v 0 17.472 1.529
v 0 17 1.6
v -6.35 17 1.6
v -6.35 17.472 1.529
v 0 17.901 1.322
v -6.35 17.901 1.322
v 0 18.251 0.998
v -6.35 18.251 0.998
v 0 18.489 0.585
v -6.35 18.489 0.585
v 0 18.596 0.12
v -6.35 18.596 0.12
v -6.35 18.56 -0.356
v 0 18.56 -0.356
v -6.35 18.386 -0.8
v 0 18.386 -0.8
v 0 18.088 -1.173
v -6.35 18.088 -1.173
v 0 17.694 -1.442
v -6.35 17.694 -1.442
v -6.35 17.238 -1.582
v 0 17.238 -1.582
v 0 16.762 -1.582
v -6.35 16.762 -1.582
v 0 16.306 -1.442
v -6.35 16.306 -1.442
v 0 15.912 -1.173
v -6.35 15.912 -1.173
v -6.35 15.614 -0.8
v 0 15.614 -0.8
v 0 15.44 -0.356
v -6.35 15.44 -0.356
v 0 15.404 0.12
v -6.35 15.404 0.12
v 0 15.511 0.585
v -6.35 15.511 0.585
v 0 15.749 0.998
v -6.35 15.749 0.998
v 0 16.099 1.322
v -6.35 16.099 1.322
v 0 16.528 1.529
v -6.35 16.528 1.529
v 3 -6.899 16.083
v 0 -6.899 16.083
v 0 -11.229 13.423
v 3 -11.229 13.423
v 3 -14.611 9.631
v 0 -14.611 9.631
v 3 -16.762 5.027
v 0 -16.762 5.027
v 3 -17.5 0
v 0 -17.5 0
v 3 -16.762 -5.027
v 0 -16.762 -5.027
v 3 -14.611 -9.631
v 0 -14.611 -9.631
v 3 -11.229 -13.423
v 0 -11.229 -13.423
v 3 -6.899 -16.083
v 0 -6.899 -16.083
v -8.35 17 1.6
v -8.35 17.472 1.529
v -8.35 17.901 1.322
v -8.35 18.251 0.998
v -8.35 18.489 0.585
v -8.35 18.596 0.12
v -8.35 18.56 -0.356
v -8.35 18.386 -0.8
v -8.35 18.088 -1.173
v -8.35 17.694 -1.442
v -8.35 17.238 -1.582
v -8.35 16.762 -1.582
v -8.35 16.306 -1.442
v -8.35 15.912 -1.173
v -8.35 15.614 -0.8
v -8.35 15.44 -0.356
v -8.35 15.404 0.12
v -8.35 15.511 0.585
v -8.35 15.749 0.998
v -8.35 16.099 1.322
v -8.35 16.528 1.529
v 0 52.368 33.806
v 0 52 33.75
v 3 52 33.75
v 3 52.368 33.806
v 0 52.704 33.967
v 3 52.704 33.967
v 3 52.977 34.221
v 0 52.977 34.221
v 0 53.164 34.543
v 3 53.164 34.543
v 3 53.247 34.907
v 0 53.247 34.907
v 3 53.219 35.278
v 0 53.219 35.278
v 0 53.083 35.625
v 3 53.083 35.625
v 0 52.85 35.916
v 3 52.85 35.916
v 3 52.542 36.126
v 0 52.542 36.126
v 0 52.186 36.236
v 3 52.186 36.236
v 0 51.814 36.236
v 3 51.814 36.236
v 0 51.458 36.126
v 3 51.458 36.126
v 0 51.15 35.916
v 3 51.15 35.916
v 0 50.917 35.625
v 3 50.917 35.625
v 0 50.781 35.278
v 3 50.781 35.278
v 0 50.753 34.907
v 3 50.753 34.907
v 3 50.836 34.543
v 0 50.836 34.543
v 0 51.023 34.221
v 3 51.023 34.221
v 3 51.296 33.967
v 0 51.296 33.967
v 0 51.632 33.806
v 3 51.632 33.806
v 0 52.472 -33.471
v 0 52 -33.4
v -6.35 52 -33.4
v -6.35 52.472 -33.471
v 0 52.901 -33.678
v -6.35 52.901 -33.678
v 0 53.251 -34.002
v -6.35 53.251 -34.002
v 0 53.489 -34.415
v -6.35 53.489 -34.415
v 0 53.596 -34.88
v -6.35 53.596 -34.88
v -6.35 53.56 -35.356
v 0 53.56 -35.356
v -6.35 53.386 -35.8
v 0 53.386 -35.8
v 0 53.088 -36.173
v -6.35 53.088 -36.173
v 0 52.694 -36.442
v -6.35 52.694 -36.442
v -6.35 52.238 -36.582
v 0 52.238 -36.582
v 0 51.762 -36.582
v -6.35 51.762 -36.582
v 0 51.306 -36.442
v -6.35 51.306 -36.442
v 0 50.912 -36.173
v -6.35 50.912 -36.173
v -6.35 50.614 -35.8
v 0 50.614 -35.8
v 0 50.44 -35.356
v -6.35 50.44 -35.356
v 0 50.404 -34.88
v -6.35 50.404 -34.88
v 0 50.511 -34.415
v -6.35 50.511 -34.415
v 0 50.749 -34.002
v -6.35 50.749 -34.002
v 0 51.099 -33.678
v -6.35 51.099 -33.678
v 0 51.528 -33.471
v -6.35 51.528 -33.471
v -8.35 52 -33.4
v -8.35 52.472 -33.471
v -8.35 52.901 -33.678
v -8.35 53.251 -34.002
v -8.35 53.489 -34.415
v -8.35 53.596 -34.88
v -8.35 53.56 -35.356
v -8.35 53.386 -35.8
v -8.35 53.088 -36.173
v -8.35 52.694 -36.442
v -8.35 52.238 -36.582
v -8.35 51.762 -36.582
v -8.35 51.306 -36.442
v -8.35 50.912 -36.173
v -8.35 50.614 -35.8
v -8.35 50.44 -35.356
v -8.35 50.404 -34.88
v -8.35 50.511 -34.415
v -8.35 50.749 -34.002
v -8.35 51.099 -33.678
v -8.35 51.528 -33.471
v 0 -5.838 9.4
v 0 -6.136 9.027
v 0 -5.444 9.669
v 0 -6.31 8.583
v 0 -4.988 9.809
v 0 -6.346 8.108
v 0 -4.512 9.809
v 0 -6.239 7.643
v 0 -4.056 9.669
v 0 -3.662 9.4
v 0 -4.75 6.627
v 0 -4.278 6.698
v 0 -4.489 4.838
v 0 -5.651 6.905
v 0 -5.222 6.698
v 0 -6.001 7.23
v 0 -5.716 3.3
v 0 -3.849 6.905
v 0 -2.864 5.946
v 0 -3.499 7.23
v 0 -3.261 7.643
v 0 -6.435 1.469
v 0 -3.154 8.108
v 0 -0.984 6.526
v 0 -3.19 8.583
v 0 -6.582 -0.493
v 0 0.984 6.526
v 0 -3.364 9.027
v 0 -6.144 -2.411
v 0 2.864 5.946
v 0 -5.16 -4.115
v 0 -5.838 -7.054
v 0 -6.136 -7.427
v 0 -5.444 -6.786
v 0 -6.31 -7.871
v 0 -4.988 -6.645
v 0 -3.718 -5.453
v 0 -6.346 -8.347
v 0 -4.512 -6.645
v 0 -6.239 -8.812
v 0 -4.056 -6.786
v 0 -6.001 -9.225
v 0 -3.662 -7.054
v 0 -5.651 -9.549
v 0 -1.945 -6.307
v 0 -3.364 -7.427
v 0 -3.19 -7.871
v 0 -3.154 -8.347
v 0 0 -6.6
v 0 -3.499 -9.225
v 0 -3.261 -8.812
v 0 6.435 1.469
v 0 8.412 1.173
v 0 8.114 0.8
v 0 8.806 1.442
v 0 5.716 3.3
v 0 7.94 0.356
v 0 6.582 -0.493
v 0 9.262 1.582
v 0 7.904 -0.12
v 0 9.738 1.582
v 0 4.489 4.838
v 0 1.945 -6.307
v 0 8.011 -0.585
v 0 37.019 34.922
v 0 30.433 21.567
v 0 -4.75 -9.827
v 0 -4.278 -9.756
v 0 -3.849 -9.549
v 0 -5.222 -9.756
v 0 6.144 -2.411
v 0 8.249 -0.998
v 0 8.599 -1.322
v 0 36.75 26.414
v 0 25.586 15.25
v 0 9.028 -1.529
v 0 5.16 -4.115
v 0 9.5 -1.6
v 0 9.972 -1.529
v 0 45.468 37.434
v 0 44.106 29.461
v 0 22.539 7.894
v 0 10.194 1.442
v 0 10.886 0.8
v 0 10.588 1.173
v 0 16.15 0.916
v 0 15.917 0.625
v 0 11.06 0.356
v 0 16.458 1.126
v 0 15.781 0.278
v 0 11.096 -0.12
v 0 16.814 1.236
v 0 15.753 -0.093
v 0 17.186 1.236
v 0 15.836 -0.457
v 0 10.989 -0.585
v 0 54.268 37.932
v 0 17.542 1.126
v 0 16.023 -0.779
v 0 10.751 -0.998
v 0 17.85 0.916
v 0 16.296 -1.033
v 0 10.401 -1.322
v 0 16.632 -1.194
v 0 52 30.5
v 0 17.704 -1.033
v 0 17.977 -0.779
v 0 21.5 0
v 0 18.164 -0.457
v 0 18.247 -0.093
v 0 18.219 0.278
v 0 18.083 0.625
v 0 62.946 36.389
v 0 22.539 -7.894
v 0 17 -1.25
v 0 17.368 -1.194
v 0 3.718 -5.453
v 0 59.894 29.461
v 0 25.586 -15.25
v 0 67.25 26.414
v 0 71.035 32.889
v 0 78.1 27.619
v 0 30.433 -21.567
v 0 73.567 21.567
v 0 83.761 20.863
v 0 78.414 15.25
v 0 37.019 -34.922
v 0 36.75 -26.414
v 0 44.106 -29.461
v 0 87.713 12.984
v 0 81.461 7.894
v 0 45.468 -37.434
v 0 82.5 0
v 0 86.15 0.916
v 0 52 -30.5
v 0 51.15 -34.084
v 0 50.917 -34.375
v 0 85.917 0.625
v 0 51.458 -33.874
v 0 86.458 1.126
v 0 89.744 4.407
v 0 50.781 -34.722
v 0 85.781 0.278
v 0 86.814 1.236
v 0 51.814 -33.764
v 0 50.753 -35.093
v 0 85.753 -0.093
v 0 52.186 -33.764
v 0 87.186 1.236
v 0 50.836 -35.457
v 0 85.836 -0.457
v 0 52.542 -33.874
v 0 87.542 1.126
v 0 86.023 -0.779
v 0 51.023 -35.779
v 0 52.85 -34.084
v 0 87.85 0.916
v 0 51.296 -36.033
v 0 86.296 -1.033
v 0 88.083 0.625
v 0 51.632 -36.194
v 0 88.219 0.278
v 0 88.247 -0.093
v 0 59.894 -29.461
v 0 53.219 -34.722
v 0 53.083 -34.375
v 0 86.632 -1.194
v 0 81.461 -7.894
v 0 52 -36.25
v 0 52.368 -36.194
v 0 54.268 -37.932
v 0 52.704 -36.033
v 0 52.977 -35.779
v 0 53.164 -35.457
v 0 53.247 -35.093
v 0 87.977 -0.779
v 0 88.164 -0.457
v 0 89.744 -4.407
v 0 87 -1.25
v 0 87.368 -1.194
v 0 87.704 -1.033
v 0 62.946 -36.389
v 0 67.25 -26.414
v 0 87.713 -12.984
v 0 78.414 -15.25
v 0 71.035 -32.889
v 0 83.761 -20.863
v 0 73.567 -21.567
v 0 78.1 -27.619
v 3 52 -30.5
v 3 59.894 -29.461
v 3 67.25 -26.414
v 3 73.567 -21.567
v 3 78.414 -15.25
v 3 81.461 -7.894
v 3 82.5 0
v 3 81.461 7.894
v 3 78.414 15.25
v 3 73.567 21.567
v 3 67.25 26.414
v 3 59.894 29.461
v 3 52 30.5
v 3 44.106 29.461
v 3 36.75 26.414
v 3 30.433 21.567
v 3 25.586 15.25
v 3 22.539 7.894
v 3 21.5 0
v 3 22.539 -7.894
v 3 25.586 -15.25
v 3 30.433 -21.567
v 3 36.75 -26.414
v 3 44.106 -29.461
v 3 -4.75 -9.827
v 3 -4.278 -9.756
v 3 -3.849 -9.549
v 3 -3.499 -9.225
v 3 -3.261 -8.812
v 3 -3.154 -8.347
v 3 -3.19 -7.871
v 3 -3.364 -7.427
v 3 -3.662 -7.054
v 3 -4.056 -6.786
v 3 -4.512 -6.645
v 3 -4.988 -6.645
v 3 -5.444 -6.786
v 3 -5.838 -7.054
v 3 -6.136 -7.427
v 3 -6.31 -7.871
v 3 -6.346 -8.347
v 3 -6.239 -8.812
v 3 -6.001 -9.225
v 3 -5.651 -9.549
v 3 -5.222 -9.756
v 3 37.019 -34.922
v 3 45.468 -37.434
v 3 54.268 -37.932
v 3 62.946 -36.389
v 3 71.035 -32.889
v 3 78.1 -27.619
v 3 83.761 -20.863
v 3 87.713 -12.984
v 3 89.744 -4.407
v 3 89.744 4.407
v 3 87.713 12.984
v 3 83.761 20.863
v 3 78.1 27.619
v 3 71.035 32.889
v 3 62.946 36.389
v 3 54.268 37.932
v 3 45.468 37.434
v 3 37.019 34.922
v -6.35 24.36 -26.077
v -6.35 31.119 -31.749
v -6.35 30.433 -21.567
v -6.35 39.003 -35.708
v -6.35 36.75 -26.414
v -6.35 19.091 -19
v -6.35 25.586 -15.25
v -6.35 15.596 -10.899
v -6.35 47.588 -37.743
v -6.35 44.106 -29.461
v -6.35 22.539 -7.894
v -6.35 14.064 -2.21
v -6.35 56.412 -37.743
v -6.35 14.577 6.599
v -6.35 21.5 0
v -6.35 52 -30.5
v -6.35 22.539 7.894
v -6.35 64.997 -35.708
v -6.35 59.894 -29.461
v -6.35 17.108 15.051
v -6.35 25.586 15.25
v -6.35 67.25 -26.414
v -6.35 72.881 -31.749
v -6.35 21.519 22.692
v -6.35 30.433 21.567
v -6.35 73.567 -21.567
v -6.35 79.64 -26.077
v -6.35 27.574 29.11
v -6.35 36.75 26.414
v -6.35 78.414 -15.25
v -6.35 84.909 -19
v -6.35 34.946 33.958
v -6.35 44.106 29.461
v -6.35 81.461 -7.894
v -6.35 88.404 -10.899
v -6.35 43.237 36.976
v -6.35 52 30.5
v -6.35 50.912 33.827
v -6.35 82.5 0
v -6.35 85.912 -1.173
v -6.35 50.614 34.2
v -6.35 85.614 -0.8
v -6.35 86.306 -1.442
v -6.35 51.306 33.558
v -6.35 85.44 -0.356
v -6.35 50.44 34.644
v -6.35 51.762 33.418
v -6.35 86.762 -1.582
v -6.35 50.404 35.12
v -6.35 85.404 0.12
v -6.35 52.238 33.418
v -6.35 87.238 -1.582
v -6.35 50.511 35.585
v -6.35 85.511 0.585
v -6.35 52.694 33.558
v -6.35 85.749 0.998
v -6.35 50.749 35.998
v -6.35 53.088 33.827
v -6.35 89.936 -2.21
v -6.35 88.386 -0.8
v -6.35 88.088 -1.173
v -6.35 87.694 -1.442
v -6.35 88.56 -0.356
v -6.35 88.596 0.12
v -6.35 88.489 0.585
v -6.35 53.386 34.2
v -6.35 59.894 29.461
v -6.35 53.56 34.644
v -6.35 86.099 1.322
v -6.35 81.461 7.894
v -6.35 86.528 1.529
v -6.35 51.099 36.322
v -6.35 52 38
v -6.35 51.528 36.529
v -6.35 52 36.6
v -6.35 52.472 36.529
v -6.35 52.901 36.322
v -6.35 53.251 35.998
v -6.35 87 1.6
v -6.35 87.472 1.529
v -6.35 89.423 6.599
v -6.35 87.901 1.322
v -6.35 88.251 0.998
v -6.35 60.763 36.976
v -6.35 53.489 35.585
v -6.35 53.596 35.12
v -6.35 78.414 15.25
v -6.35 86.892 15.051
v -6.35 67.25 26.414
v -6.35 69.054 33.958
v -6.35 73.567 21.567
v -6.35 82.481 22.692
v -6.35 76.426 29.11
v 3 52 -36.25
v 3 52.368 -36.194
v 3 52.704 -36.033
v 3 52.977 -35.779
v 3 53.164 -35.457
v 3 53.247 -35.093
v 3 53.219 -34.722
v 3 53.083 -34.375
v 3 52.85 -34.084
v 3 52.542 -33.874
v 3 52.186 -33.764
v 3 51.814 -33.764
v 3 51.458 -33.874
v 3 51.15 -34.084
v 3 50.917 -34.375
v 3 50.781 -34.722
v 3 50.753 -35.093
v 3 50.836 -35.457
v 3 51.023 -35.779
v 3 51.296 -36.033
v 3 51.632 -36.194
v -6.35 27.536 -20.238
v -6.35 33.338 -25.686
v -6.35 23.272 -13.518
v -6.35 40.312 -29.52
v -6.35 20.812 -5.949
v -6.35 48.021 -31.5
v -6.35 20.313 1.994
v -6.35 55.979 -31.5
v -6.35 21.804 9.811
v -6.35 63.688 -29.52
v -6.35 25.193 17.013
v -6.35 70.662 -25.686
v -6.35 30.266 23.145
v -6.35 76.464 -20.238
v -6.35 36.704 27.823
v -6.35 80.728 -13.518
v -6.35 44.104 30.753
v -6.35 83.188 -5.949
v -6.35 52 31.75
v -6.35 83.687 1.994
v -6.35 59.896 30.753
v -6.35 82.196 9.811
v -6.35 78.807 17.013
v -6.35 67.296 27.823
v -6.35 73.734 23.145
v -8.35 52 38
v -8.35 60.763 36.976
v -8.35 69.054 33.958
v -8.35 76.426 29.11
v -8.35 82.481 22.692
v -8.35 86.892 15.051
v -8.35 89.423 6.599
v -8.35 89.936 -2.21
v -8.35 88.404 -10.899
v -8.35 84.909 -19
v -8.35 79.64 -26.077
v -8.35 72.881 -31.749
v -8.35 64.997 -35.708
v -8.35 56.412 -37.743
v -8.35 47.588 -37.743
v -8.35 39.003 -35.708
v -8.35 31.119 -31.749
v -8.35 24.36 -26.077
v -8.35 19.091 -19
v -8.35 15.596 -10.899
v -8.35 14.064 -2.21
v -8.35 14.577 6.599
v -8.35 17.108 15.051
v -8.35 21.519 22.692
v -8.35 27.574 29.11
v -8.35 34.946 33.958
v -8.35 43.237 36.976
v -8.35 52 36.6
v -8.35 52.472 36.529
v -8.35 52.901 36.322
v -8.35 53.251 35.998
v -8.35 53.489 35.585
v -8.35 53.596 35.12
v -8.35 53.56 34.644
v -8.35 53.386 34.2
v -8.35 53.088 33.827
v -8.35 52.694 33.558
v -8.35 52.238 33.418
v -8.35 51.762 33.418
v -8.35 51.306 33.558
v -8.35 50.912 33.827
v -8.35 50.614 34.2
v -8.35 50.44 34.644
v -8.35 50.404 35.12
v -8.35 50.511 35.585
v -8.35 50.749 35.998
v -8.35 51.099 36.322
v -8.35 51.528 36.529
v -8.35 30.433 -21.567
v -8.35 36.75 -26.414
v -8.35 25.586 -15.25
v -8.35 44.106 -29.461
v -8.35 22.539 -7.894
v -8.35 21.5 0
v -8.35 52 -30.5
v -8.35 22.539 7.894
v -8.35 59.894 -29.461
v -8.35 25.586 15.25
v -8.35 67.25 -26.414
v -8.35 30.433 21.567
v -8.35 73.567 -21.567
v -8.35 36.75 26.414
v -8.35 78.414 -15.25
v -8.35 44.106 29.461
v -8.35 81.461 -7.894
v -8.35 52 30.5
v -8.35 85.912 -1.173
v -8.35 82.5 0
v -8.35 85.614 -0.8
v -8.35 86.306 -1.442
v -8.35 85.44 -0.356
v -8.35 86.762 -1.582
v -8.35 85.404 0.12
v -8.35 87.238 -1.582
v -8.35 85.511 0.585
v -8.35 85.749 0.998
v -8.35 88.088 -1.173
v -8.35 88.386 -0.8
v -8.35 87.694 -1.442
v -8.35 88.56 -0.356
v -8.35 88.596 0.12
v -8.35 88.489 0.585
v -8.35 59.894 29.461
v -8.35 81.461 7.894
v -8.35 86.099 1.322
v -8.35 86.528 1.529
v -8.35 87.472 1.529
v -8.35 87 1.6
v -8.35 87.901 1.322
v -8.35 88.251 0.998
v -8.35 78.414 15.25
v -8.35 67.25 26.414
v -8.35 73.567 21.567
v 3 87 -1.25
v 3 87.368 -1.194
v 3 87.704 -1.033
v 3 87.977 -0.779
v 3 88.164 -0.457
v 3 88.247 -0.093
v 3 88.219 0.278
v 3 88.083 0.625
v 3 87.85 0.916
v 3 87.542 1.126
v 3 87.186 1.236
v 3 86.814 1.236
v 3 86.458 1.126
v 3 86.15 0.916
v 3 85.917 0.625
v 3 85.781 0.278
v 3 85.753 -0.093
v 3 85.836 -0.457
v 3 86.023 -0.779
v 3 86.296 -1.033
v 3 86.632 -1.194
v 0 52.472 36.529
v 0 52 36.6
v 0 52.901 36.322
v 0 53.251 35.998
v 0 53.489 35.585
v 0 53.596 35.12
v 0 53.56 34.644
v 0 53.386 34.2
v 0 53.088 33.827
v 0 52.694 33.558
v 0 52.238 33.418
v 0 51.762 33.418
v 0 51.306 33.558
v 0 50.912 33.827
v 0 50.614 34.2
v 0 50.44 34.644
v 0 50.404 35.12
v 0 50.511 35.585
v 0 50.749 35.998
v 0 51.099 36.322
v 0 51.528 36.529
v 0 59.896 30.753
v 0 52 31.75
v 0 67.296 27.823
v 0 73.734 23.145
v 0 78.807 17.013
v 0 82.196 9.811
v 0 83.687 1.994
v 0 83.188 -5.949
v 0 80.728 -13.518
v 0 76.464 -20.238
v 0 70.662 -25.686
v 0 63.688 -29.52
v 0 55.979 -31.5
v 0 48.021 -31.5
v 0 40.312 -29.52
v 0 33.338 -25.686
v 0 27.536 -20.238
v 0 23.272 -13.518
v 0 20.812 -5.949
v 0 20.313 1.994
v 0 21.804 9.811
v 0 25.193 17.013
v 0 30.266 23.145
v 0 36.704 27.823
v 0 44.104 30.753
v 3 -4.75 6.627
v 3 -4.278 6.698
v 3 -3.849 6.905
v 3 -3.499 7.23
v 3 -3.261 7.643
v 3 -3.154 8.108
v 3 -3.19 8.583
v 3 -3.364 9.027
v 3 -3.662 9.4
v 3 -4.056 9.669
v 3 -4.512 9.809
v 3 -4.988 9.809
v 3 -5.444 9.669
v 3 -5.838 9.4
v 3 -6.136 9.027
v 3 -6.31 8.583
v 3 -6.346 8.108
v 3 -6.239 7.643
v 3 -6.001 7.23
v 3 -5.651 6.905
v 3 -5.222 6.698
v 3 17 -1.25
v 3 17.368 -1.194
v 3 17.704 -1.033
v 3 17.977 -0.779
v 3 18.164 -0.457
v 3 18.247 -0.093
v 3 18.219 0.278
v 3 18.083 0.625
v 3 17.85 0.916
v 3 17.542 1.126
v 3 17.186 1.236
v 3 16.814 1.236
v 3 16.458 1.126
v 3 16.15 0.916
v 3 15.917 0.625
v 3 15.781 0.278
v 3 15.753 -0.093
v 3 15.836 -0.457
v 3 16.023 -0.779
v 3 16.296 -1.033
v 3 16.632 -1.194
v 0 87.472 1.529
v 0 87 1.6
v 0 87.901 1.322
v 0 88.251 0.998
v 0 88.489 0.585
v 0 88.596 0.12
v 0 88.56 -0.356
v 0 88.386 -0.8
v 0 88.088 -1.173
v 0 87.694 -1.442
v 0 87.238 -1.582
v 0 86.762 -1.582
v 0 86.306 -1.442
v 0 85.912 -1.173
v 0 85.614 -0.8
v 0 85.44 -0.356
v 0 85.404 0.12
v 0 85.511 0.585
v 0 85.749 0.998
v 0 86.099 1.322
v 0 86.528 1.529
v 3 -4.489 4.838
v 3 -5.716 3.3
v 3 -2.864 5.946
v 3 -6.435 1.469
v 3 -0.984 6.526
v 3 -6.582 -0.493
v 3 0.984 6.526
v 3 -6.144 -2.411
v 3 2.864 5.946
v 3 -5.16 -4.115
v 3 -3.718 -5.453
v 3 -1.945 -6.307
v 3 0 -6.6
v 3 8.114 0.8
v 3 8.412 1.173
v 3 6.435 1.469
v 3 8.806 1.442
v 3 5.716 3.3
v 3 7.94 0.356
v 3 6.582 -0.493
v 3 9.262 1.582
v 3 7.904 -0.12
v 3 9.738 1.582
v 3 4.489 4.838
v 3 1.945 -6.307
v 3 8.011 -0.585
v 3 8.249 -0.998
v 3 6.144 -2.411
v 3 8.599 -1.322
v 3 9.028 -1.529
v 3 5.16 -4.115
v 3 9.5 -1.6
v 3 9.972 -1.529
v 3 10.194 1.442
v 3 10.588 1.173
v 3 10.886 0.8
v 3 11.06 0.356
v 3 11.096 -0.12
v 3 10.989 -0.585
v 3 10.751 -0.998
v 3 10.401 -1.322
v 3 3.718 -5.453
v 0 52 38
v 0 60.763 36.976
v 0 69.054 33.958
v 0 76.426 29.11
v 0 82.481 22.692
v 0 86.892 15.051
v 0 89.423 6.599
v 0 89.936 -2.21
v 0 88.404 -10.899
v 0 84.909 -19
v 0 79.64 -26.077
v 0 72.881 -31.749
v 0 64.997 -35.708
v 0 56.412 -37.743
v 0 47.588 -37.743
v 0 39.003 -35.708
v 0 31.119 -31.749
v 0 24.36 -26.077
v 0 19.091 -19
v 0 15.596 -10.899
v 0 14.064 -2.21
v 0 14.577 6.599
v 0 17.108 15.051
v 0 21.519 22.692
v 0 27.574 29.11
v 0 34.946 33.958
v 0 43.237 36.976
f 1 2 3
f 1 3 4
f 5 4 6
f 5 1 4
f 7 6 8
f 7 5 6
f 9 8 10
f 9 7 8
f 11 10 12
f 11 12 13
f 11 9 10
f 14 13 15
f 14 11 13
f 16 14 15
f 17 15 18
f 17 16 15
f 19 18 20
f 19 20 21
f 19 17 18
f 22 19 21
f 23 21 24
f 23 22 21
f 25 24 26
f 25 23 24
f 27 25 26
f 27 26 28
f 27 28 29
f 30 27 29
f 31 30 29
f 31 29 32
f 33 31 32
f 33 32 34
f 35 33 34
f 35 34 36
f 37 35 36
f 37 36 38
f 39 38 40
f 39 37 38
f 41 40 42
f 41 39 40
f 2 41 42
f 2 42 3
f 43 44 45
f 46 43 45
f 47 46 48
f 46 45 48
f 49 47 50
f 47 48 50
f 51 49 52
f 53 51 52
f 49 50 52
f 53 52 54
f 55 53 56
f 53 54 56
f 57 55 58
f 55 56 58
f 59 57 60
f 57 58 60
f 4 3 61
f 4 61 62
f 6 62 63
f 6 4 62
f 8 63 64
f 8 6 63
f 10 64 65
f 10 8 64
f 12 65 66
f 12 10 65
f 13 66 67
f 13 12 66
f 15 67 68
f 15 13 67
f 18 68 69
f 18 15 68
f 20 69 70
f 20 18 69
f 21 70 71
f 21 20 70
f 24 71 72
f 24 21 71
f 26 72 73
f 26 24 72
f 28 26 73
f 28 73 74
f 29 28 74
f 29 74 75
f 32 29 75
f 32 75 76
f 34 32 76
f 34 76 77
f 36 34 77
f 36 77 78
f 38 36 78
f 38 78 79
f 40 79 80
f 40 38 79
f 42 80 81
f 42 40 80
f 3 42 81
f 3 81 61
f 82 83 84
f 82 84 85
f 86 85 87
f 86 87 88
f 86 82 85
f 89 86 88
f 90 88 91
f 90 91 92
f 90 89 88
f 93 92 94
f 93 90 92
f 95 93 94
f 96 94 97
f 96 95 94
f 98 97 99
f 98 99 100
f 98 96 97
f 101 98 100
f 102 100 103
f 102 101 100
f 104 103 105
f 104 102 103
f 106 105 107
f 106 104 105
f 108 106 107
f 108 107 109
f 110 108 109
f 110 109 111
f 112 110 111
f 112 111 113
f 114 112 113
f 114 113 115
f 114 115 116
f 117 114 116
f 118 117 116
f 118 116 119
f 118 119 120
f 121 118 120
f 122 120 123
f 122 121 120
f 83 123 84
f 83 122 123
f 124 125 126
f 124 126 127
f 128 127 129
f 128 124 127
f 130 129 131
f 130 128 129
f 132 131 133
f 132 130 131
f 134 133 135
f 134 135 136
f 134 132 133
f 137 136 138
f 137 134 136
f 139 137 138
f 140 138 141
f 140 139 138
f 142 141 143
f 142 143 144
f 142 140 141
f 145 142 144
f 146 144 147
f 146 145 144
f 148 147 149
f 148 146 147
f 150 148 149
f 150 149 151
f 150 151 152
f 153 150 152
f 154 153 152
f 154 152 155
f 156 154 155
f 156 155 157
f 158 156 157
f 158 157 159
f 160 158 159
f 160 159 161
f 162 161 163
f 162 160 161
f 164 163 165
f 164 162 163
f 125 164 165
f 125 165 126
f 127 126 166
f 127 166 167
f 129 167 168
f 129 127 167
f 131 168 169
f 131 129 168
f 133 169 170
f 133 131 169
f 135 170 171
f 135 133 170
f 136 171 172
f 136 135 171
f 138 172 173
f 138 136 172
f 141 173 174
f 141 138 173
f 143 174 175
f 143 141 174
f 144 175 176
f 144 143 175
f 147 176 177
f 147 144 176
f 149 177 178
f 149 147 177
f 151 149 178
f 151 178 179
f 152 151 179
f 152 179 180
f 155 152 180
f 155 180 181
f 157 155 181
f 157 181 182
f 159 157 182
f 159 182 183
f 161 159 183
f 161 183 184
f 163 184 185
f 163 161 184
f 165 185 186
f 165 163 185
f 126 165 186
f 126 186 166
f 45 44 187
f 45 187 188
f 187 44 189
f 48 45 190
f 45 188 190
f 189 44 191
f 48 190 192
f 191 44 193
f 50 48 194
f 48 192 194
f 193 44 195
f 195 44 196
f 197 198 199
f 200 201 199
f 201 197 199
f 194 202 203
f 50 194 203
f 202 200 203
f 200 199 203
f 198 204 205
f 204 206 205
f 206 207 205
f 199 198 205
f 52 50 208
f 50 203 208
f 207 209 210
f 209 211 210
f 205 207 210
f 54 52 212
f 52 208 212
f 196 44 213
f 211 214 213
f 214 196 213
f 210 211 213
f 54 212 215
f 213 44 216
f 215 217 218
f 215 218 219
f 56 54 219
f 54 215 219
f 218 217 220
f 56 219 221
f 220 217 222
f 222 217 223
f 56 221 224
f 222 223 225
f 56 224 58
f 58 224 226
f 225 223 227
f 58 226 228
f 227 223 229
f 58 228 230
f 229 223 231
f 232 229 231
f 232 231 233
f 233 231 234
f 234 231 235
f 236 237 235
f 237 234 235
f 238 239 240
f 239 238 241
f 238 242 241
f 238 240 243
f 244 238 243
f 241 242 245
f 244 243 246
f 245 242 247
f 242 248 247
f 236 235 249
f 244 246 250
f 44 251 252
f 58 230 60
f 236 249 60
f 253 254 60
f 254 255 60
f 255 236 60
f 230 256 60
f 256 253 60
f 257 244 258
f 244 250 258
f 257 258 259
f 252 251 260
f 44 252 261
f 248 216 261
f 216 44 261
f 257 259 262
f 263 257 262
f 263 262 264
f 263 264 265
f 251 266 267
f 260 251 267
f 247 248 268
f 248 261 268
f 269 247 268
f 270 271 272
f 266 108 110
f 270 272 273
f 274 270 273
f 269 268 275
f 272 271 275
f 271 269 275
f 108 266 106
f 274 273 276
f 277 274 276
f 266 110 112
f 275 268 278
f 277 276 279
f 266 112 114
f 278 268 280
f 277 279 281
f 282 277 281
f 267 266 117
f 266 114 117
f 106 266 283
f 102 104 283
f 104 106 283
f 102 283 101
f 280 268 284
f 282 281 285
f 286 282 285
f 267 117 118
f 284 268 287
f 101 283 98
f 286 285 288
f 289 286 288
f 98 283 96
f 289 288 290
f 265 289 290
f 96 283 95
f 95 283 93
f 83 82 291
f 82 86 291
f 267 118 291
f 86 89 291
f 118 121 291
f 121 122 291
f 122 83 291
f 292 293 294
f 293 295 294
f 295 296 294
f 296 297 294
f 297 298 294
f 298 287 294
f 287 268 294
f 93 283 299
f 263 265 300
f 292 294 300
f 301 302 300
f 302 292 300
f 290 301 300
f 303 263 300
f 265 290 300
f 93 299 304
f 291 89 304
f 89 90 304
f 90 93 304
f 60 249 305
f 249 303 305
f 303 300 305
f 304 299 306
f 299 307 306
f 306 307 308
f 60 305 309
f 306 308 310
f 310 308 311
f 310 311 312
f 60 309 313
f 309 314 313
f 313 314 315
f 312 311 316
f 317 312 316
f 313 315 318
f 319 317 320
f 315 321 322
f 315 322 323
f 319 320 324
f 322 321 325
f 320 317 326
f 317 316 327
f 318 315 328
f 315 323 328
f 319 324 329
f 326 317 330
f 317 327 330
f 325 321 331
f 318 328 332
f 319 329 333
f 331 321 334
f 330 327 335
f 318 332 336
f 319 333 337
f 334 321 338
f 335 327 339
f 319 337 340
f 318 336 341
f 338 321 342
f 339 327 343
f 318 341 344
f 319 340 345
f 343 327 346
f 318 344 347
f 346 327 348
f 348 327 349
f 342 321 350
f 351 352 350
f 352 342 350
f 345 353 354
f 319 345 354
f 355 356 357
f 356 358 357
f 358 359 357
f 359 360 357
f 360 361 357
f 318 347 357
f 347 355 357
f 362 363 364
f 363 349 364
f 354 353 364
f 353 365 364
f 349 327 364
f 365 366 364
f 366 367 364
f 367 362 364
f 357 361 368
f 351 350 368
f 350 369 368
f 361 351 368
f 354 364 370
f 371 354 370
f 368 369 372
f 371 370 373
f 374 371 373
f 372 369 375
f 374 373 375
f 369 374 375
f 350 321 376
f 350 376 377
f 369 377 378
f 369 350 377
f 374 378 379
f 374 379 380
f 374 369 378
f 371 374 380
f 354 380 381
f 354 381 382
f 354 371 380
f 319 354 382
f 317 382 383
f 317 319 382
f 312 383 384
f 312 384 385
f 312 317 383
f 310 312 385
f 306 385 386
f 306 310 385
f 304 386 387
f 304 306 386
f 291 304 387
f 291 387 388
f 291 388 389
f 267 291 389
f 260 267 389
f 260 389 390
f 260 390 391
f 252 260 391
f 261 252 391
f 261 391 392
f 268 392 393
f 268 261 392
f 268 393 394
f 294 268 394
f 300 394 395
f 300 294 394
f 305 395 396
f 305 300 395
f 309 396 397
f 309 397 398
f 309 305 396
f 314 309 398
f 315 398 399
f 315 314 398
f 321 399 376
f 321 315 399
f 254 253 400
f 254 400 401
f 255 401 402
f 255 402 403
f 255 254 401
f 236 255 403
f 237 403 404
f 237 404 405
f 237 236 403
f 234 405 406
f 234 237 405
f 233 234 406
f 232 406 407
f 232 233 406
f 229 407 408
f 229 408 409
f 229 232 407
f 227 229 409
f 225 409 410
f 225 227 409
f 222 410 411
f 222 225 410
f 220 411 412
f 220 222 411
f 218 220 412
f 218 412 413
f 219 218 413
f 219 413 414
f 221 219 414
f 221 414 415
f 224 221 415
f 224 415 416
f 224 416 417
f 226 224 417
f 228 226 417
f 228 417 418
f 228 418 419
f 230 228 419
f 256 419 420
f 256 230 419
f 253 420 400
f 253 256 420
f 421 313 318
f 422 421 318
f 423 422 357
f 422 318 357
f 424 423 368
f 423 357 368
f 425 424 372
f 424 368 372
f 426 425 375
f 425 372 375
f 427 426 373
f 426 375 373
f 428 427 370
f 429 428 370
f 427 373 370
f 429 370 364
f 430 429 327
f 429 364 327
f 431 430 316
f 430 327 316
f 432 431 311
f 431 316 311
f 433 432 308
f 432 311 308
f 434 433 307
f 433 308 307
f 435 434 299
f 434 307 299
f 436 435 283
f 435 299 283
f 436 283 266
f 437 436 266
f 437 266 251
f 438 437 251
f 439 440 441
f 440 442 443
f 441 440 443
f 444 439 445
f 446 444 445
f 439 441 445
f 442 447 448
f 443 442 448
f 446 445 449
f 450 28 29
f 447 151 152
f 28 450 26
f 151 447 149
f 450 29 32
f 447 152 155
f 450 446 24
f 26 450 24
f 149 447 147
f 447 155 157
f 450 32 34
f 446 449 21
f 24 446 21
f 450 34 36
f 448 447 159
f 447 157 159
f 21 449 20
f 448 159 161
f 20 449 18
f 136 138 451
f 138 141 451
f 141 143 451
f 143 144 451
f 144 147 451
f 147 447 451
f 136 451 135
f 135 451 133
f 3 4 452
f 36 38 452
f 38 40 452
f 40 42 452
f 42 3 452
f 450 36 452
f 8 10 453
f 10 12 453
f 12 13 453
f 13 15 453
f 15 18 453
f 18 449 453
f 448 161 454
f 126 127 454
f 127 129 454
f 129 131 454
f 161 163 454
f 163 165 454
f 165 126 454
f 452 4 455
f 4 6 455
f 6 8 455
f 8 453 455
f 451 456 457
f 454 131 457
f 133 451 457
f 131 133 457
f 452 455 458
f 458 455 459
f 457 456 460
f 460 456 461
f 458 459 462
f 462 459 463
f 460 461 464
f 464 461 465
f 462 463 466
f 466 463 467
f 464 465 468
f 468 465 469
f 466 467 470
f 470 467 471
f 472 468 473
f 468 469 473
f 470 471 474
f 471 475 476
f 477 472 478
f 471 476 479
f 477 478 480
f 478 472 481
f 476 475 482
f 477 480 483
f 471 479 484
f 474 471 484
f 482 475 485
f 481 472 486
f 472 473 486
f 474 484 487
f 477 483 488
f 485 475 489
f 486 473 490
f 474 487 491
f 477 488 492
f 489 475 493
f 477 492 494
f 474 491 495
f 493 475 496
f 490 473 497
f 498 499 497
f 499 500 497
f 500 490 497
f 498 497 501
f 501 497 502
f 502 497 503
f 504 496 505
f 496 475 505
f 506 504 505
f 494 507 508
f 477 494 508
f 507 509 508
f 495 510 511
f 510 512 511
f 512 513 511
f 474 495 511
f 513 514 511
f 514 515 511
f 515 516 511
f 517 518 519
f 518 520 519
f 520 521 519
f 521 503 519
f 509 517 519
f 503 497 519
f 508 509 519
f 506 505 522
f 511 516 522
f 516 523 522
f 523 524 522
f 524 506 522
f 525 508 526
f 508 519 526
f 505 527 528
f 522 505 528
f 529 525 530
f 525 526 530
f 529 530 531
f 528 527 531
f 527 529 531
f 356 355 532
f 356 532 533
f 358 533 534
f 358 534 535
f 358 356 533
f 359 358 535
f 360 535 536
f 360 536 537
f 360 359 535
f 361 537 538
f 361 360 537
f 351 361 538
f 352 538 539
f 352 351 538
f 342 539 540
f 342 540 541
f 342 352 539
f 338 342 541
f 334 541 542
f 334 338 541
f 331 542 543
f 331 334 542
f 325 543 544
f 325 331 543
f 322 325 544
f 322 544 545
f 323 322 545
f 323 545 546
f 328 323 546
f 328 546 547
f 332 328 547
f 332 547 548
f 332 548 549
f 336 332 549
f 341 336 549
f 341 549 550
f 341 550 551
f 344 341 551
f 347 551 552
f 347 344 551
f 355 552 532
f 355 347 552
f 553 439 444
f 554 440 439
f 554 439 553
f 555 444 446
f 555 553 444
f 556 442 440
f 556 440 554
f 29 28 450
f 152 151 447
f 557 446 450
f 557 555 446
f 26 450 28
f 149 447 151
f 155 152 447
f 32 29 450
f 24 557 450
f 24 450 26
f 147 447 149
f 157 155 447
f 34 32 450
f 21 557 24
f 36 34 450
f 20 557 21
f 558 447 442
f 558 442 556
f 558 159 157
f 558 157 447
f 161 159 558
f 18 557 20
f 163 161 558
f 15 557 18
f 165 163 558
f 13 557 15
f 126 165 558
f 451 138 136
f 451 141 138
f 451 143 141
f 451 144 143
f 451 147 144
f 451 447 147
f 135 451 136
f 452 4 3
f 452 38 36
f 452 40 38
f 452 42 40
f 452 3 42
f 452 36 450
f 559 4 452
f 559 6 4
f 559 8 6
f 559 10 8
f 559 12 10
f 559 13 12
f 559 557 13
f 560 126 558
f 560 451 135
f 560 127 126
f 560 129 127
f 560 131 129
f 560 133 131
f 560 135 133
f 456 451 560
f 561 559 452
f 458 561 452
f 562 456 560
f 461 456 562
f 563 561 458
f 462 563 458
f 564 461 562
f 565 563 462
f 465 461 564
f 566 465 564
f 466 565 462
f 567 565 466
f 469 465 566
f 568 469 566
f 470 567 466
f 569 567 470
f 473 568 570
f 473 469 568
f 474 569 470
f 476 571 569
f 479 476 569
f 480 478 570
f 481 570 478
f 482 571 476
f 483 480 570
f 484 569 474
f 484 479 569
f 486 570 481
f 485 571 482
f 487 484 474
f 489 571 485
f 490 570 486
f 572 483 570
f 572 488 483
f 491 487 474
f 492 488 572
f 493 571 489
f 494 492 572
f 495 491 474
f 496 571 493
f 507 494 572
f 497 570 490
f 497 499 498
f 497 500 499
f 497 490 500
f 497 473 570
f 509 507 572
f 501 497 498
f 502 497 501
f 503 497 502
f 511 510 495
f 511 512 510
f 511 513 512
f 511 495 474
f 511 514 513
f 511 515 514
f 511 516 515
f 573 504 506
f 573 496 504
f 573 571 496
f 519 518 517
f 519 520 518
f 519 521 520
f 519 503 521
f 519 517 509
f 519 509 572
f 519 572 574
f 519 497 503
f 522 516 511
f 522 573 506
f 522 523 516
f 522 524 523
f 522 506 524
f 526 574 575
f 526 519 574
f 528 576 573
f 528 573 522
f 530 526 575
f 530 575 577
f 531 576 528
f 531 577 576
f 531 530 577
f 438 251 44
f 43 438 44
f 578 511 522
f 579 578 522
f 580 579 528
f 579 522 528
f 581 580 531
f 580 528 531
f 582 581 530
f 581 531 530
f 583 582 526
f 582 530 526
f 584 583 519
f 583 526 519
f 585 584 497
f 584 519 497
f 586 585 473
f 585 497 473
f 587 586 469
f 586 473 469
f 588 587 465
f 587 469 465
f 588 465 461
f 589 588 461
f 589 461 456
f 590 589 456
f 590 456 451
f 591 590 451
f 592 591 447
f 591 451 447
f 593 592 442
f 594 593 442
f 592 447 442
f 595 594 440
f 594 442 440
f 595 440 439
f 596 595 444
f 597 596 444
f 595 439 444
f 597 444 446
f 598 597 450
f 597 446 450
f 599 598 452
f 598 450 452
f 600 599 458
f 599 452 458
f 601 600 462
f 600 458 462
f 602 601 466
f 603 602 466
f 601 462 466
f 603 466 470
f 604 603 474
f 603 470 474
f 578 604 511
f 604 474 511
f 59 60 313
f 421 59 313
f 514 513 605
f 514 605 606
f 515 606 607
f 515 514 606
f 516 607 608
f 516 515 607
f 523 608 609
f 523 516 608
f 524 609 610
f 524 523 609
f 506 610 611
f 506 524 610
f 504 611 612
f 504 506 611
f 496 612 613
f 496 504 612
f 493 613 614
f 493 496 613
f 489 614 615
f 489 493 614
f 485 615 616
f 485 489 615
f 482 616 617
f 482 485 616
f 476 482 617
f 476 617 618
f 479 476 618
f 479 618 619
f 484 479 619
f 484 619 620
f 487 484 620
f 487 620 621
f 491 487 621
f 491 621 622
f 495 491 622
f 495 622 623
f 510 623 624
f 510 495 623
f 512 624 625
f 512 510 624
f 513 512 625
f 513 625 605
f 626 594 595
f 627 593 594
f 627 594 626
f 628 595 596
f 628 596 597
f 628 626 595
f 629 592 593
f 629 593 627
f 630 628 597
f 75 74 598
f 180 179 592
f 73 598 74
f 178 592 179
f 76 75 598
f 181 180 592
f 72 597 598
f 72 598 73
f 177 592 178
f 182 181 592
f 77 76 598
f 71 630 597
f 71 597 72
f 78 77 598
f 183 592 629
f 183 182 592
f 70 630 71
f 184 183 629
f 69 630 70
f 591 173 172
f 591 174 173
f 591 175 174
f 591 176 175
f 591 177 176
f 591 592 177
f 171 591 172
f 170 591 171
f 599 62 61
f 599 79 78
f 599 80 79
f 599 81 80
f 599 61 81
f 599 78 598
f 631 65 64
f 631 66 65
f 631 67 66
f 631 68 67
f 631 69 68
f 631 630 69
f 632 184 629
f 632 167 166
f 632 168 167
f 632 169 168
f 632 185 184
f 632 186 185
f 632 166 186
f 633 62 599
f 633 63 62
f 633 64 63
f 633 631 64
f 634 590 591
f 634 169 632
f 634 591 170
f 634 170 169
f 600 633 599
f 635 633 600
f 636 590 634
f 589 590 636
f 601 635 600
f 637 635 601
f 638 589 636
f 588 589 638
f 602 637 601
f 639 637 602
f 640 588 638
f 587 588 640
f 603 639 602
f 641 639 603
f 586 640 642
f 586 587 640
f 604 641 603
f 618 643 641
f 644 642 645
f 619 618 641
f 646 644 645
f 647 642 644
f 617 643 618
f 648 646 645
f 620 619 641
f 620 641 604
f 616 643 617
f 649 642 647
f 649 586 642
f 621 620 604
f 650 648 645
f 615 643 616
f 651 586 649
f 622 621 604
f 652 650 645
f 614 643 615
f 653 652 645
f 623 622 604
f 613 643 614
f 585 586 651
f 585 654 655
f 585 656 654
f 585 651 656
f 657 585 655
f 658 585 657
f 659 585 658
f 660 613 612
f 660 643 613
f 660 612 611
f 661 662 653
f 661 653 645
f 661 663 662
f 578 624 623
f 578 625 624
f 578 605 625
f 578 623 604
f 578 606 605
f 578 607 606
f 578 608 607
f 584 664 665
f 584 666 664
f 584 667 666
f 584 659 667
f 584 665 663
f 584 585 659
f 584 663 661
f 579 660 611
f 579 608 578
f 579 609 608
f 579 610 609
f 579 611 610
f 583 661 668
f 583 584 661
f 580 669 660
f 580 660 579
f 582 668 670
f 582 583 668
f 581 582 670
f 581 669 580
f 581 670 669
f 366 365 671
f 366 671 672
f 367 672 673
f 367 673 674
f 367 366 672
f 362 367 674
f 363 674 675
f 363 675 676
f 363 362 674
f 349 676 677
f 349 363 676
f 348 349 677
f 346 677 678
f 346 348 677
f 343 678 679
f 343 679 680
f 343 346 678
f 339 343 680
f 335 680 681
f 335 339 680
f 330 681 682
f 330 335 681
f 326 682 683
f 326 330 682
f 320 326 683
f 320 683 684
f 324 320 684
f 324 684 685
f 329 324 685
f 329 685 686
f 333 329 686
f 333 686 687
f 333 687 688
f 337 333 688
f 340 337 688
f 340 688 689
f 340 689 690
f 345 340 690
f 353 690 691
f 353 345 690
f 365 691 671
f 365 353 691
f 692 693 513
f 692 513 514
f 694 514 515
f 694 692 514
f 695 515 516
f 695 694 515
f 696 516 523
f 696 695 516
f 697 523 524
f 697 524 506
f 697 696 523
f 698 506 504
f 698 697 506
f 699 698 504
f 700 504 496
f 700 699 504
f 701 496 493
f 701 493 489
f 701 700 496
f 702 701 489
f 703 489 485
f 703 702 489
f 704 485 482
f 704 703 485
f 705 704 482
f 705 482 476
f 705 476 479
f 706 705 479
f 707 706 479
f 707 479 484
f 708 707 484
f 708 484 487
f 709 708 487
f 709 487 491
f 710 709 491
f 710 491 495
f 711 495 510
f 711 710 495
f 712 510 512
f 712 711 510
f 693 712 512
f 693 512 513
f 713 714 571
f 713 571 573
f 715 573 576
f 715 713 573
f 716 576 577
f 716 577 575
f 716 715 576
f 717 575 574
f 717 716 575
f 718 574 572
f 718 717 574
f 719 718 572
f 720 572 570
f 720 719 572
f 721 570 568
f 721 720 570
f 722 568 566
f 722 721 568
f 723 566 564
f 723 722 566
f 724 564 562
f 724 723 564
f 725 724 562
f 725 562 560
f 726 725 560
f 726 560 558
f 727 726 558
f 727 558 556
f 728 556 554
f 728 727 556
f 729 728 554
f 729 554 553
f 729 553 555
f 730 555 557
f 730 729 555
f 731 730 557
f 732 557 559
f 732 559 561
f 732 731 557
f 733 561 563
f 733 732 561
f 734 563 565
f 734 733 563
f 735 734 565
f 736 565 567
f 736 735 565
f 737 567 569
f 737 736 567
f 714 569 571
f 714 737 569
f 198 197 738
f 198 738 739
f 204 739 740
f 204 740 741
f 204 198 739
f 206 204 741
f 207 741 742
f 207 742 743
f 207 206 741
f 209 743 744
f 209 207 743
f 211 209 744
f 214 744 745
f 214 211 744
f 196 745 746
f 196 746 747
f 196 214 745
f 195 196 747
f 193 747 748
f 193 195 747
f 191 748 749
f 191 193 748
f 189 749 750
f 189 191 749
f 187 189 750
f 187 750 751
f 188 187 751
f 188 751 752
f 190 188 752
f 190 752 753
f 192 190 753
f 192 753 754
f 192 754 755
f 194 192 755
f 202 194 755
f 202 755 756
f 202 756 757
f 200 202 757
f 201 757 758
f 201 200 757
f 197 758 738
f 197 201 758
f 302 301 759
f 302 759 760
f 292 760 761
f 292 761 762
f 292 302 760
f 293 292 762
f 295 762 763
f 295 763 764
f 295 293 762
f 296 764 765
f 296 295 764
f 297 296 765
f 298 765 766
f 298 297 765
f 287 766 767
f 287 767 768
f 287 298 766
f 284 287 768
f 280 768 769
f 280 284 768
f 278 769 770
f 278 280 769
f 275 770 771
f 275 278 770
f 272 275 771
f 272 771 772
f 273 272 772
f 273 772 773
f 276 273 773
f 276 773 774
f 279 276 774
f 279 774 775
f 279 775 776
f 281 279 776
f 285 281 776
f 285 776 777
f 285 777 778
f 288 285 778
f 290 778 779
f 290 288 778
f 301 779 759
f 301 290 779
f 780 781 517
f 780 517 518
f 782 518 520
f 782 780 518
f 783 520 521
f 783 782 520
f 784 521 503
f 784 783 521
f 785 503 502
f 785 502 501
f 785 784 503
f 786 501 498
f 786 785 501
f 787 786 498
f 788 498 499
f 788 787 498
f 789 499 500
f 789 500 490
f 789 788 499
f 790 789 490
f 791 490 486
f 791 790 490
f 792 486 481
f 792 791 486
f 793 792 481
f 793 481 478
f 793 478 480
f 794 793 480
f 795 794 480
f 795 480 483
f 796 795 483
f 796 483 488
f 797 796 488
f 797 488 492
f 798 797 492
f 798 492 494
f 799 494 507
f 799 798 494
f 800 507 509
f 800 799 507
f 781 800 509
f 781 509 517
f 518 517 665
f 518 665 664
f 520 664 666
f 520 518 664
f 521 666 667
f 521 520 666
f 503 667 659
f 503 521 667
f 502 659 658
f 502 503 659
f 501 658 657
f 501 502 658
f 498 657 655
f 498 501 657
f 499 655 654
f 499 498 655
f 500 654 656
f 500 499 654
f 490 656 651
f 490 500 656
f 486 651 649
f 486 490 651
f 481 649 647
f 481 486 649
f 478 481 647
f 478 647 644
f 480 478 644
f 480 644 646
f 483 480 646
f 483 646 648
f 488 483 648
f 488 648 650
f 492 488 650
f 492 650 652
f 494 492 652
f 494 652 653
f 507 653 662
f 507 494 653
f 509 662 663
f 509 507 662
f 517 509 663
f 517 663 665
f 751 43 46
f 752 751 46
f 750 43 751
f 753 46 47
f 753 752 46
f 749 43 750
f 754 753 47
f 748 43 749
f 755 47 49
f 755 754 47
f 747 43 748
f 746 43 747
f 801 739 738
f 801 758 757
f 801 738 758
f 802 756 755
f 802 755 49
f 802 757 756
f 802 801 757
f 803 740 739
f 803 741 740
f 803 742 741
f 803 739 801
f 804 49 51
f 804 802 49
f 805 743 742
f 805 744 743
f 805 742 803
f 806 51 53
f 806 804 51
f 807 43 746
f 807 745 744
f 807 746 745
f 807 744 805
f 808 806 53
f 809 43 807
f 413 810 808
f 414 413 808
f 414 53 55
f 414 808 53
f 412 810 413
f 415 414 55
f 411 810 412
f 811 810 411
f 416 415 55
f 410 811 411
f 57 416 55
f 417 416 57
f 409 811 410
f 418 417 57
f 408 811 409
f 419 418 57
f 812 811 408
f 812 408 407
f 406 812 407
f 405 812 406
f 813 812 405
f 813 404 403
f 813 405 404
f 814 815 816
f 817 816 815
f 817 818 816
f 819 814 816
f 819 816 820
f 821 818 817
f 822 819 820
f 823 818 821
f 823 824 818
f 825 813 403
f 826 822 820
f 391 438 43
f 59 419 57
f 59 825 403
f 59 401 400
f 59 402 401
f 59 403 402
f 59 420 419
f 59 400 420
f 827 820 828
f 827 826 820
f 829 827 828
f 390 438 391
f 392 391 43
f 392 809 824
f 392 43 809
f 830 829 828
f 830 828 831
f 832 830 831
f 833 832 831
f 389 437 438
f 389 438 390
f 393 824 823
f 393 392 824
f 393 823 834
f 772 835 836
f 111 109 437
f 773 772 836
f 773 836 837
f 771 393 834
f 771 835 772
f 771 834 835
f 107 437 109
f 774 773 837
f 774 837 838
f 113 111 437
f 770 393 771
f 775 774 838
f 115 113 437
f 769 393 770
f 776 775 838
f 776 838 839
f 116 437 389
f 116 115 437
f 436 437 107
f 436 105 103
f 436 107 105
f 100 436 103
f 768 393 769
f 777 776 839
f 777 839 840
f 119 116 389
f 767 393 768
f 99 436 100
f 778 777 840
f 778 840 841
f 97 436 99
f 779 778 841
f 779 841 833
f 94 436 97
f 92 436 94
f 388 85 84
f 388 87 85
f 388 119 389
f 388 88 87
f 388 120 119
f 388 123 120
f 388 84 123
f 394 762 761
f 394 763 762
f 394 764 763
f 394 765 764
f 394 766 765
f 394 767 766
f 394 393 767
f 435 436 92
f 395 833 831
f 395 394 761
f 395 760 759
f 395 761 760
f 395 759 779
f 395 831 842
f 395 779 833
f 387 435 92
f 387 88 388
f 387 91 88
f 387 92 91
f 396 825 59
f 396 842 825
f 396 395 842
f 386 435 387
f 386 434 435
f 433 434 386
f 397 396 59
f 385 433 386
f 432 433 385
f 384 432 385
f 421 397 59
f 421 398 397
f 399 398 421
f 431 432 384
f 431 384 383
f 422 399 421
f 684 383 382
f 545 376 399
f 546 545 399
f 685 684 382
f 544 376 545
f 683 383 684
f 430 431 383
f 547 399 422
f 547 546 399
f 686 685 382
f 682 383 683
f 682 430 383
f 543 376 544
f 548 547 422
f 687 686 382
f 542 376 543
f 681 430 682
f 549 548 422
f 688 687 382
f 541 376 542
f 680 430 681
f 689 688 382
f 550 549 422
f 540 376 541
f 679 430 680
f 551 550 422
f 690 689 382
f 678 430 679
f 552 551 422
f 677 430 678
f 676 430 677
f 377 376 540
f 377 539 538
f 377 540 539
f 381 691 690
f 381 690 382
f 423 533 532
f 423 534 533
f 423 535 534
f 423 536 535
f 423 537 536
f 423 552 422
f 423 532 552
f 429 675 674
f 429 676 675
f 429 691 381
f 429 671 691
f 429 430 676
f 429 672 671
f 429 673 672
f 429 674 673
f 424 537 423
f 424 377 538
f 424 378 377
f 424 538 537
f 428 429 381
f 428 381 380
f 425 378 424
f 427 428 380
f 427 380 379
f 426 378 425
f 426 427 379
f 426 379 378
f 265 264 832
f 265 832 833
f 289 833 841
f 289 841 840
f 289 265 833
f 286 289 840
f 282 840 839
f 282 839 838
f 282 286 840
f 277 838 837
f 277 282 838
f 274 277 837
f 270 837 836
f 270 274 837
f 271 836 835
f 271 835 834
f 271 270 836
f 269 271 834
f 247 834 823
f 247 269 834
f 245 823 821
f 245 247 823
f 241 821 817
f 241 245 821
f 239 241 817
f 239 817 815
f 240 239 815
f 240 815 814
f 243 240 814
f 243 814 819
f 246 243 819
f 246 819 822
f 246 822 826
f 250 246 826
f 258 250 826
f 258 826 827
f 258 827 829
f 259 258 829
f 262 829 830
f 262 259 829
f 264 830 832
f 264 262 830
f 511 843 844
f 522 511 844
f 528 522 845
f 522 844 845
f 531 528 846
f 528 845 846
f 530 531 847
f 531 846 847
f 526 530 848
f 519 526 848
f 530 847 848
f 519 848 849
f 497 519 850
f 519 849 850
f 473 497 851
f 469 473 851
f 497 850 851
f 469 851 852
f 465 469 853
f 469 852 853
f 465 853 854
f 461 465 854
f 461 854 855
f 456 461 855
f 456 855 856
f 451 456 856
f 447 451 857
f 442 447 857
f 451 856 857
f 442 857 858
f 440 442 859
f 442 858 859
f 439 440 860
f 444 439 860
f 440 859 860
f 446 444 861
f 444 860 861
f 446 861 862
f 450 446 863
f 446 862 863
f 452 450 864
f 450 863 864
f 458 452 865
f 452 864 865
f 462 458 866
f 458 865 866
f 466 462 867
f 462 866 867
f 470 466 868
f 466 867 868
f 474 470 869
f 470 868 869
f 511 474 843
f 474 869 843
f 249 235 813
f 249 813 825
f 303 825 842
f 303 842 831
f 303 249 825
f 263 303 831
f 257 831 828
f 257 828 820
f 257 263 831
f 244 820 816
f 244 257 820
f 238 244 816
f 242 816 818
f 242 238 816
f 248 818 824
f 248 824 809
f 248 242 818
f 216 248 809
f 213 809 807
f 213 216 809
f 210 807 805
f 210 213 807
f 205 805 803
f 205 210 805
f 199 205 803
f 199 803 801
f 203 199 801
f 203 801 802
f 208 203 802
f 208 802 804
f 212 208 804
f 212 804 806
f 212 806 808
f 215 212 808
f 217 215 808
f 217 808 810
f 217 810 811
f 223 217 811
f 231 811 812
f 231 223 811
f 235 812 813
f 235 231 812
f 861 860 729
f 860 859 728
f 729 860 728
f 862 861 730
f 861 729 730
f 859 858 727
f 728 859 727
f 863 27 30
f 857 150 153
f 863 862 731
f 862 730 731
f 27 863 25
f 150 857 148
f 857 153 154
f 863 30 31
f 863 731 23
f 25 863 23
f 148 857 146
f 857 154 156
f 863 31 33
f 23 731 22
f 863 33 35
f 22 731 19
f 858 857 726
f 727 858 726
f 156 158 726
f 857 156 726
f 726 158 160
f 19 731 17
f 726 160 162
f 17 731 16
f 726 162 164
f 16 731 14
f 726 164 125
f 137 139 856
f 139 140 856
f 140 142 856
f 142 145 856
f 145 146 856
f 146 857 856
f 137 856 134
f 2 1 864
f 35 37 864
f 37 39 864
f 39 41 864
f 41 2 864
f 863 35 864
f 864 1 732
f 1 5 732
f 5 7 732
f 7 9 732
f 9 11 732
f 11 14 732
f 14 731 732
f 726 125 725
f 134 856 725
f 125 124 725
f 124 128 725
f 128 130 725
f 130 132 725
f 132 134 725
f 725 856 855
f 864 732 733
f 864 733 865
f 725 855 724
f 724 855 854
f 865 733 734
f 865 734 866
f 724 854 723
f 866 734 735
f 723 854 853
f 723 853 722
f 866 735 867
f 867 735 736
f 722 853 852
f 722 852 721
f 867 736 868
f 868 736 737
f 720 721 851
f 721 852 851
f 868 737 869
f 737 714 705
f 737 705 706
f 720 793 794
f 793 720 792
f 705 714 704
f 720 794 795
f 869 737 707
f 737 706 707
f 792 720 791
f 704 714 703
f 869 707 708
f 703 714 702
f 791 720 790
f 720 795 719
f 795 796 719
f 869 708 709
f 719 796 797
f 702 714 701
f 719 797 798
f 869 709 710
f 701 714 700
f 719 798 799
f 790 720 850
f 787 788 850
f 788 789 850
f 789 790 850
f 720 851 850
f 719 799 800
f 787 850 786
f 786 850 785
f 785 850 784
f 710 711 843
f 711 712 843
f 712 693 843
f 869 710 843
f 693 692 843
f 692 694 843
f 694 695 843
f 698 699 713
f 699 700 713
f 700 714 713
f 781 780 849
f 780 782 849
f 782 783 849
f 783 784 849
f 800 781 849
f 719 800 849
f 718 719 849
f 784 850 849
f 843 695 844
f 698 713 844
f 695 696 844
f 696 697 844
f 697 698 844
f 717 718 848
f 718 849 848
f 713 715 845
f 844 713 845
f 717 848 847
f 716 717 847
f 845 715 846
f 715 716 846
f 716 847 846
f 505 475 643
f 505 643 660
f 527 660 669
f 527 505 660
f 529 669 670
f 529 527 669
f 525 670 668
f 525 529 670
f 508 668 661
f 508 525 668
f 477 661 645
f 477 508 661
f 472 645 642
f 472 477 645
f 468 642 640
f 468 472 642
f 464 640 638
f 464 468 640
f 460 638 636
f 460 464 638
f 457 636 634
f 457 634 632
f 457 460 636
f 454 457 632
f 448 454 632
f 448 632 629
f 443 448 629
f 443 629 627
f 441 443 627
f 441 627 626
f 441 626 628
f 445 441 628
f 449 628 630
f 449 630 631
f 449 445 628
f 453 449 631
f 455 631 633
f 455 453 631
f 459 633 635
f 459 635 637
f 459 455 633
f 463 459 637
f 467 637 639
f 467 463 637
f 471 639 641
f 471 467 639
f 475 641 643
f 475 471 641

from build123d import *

# Parameters (mm, degrees)
SKETCH_2_R      = 6.6
SKETCH_2_R_2    = 1.6
SKETCH_2_R_3    = 30.5
SKETCH_2_R_4    = 1.25
EXTRUDE_1_DEPTH = 3
SKETCH_6_R      = 38
SKETCH_6_R_2    = 31.75
SKETCH_6_R_3    = 1.6
EXTRUDE_4_DEPTH = 6.35
SKETCH_7_R      = 38
SKETCH_7_R_2    = 30.5
SKETCH_7_R_3    = 1.6
EXTRUDE_5_DEPTH = 2


with BuildPart() as part:
    # ｽｹｯﾁ2 → ﾎﾞｽ - 押し出し1 (new body)
    with BuildSketch(Plane(origin=(0, 0, 0), x_dir=(0, 0, -1), z_dir=(1, 0, 0))):
        with BuildLine():
            Line((-34.922436245, 37.019230769), (-16.082700902, -6.899038462))
            ThreePointArc((-16.082700902, -6.899038462), (0, -17.5), (16.082700902, -6.899038462))
            Line((16.082700902, -6.899038462), (34.922436245, 37.019230769))
            ThreePointArc((34.922436245, 37.019230769), (0, 90), (-34.922436245, 37.019230769))
        make_face()
        Circle(SKETCH_2_R, mode=Mode.SUBTRACT)
        with Locations((0, 9.5)):
            Circle(SKETCH_2_R_2, mode=Mode.SUBTRACT)
        with Locations((8.227241336, -4.75)):
            Circle(SKETCH_2_R_2, mode=Mode.SUBTRACT)
        with Locations((-8.227241336, -4.75)):
            Circle(SKETCH_2_R_2, mode=Mode.SUBTRACT)
        with Locations((0, 52)):
            Circle(SKETCH_2_R_3, mode=Mode.SUBTRACT)
        with Locations((0, 87)):
            Circle(SKETCH_2_R_4, mode=Mode.SUBTRACT)
        with Locations((0, 17)):
            Circle(SKETCH_2_R_4, mode=Mode.SUBTRACT)
        with Locations((35, 52)):
            Circle(SKETCH_2_R_4, mode=Mode.SUBTRACT)
        with Locations((-35, 52)):
            Circle(SKETCH_2_R_4, mode=Mode.SUBTRACT)
    extrude(amount=EXTRUDE_1_DEPTH)


with BuildPart() as body_2:
    # ｽｹｯﾁ6 → ﾎﾞｽ - 押し出し4 (new body)
    with BuildSketch(Plane.ZY):
        with Locations((0, 52)):
            Circle(SKETCH_6_R)
        with Locations((0, 52)):
            Circle(SKETCH_6_R_2, mode=Mode.SUBTRACT)
        with Locations((0, 87)):
            Circle(SKETCH_6_R_3, mode=Mode.SUBTRACT)
        with Locations((35, 52)):
            Circle(SKETCH_6_R_3, mode=Mode.SUBTRACT)
        with Locations((0, 17)):
            Circle(SKETCH_6_R_3, mode=Mode.SUBTRACT)
        with Locations((-35, 52)):
            Circle(SKETCH_6_R_3, mode=Mode.SUBTRACT)
    extrude(amount=EXTRUDE_4_DEPTH)


with BuildPart() as body_3:
    # ｽｹｯﾁ7 → ﾎﾞｽ - 押し出し5 (new body)
    with BuildSketch(Plane.ZY.offset(6.35)):
        with Locations((0, 52)):
            Circle(SKETCH_7_R)
        with Locations((0, 52)):
            Circle(SKETCH_7_R_2, mode=Mode.SUBTRACT)
        with Locations((0, 17)):
            Circle(SKETCH_7_R_3, mode=Mode.SUBTRACT)
        with Locations((35, 52)):
            Circle(SKETCH_7_R_3, mode=Mode.SUBTRACT)
        with Locations((-35, 52)):
            Circle(SKETCH_7_R_3, mode=Mode.SUBTRACT)
        with Locations((0, 87)):
            Circle(SKETCH_7_R_3, mode=Mode.SUBTRACT)
    extrude(amount=EXTRUDE_5_DEPTH)


solid = Compound([part.part, body_2.part, body_3.part])
